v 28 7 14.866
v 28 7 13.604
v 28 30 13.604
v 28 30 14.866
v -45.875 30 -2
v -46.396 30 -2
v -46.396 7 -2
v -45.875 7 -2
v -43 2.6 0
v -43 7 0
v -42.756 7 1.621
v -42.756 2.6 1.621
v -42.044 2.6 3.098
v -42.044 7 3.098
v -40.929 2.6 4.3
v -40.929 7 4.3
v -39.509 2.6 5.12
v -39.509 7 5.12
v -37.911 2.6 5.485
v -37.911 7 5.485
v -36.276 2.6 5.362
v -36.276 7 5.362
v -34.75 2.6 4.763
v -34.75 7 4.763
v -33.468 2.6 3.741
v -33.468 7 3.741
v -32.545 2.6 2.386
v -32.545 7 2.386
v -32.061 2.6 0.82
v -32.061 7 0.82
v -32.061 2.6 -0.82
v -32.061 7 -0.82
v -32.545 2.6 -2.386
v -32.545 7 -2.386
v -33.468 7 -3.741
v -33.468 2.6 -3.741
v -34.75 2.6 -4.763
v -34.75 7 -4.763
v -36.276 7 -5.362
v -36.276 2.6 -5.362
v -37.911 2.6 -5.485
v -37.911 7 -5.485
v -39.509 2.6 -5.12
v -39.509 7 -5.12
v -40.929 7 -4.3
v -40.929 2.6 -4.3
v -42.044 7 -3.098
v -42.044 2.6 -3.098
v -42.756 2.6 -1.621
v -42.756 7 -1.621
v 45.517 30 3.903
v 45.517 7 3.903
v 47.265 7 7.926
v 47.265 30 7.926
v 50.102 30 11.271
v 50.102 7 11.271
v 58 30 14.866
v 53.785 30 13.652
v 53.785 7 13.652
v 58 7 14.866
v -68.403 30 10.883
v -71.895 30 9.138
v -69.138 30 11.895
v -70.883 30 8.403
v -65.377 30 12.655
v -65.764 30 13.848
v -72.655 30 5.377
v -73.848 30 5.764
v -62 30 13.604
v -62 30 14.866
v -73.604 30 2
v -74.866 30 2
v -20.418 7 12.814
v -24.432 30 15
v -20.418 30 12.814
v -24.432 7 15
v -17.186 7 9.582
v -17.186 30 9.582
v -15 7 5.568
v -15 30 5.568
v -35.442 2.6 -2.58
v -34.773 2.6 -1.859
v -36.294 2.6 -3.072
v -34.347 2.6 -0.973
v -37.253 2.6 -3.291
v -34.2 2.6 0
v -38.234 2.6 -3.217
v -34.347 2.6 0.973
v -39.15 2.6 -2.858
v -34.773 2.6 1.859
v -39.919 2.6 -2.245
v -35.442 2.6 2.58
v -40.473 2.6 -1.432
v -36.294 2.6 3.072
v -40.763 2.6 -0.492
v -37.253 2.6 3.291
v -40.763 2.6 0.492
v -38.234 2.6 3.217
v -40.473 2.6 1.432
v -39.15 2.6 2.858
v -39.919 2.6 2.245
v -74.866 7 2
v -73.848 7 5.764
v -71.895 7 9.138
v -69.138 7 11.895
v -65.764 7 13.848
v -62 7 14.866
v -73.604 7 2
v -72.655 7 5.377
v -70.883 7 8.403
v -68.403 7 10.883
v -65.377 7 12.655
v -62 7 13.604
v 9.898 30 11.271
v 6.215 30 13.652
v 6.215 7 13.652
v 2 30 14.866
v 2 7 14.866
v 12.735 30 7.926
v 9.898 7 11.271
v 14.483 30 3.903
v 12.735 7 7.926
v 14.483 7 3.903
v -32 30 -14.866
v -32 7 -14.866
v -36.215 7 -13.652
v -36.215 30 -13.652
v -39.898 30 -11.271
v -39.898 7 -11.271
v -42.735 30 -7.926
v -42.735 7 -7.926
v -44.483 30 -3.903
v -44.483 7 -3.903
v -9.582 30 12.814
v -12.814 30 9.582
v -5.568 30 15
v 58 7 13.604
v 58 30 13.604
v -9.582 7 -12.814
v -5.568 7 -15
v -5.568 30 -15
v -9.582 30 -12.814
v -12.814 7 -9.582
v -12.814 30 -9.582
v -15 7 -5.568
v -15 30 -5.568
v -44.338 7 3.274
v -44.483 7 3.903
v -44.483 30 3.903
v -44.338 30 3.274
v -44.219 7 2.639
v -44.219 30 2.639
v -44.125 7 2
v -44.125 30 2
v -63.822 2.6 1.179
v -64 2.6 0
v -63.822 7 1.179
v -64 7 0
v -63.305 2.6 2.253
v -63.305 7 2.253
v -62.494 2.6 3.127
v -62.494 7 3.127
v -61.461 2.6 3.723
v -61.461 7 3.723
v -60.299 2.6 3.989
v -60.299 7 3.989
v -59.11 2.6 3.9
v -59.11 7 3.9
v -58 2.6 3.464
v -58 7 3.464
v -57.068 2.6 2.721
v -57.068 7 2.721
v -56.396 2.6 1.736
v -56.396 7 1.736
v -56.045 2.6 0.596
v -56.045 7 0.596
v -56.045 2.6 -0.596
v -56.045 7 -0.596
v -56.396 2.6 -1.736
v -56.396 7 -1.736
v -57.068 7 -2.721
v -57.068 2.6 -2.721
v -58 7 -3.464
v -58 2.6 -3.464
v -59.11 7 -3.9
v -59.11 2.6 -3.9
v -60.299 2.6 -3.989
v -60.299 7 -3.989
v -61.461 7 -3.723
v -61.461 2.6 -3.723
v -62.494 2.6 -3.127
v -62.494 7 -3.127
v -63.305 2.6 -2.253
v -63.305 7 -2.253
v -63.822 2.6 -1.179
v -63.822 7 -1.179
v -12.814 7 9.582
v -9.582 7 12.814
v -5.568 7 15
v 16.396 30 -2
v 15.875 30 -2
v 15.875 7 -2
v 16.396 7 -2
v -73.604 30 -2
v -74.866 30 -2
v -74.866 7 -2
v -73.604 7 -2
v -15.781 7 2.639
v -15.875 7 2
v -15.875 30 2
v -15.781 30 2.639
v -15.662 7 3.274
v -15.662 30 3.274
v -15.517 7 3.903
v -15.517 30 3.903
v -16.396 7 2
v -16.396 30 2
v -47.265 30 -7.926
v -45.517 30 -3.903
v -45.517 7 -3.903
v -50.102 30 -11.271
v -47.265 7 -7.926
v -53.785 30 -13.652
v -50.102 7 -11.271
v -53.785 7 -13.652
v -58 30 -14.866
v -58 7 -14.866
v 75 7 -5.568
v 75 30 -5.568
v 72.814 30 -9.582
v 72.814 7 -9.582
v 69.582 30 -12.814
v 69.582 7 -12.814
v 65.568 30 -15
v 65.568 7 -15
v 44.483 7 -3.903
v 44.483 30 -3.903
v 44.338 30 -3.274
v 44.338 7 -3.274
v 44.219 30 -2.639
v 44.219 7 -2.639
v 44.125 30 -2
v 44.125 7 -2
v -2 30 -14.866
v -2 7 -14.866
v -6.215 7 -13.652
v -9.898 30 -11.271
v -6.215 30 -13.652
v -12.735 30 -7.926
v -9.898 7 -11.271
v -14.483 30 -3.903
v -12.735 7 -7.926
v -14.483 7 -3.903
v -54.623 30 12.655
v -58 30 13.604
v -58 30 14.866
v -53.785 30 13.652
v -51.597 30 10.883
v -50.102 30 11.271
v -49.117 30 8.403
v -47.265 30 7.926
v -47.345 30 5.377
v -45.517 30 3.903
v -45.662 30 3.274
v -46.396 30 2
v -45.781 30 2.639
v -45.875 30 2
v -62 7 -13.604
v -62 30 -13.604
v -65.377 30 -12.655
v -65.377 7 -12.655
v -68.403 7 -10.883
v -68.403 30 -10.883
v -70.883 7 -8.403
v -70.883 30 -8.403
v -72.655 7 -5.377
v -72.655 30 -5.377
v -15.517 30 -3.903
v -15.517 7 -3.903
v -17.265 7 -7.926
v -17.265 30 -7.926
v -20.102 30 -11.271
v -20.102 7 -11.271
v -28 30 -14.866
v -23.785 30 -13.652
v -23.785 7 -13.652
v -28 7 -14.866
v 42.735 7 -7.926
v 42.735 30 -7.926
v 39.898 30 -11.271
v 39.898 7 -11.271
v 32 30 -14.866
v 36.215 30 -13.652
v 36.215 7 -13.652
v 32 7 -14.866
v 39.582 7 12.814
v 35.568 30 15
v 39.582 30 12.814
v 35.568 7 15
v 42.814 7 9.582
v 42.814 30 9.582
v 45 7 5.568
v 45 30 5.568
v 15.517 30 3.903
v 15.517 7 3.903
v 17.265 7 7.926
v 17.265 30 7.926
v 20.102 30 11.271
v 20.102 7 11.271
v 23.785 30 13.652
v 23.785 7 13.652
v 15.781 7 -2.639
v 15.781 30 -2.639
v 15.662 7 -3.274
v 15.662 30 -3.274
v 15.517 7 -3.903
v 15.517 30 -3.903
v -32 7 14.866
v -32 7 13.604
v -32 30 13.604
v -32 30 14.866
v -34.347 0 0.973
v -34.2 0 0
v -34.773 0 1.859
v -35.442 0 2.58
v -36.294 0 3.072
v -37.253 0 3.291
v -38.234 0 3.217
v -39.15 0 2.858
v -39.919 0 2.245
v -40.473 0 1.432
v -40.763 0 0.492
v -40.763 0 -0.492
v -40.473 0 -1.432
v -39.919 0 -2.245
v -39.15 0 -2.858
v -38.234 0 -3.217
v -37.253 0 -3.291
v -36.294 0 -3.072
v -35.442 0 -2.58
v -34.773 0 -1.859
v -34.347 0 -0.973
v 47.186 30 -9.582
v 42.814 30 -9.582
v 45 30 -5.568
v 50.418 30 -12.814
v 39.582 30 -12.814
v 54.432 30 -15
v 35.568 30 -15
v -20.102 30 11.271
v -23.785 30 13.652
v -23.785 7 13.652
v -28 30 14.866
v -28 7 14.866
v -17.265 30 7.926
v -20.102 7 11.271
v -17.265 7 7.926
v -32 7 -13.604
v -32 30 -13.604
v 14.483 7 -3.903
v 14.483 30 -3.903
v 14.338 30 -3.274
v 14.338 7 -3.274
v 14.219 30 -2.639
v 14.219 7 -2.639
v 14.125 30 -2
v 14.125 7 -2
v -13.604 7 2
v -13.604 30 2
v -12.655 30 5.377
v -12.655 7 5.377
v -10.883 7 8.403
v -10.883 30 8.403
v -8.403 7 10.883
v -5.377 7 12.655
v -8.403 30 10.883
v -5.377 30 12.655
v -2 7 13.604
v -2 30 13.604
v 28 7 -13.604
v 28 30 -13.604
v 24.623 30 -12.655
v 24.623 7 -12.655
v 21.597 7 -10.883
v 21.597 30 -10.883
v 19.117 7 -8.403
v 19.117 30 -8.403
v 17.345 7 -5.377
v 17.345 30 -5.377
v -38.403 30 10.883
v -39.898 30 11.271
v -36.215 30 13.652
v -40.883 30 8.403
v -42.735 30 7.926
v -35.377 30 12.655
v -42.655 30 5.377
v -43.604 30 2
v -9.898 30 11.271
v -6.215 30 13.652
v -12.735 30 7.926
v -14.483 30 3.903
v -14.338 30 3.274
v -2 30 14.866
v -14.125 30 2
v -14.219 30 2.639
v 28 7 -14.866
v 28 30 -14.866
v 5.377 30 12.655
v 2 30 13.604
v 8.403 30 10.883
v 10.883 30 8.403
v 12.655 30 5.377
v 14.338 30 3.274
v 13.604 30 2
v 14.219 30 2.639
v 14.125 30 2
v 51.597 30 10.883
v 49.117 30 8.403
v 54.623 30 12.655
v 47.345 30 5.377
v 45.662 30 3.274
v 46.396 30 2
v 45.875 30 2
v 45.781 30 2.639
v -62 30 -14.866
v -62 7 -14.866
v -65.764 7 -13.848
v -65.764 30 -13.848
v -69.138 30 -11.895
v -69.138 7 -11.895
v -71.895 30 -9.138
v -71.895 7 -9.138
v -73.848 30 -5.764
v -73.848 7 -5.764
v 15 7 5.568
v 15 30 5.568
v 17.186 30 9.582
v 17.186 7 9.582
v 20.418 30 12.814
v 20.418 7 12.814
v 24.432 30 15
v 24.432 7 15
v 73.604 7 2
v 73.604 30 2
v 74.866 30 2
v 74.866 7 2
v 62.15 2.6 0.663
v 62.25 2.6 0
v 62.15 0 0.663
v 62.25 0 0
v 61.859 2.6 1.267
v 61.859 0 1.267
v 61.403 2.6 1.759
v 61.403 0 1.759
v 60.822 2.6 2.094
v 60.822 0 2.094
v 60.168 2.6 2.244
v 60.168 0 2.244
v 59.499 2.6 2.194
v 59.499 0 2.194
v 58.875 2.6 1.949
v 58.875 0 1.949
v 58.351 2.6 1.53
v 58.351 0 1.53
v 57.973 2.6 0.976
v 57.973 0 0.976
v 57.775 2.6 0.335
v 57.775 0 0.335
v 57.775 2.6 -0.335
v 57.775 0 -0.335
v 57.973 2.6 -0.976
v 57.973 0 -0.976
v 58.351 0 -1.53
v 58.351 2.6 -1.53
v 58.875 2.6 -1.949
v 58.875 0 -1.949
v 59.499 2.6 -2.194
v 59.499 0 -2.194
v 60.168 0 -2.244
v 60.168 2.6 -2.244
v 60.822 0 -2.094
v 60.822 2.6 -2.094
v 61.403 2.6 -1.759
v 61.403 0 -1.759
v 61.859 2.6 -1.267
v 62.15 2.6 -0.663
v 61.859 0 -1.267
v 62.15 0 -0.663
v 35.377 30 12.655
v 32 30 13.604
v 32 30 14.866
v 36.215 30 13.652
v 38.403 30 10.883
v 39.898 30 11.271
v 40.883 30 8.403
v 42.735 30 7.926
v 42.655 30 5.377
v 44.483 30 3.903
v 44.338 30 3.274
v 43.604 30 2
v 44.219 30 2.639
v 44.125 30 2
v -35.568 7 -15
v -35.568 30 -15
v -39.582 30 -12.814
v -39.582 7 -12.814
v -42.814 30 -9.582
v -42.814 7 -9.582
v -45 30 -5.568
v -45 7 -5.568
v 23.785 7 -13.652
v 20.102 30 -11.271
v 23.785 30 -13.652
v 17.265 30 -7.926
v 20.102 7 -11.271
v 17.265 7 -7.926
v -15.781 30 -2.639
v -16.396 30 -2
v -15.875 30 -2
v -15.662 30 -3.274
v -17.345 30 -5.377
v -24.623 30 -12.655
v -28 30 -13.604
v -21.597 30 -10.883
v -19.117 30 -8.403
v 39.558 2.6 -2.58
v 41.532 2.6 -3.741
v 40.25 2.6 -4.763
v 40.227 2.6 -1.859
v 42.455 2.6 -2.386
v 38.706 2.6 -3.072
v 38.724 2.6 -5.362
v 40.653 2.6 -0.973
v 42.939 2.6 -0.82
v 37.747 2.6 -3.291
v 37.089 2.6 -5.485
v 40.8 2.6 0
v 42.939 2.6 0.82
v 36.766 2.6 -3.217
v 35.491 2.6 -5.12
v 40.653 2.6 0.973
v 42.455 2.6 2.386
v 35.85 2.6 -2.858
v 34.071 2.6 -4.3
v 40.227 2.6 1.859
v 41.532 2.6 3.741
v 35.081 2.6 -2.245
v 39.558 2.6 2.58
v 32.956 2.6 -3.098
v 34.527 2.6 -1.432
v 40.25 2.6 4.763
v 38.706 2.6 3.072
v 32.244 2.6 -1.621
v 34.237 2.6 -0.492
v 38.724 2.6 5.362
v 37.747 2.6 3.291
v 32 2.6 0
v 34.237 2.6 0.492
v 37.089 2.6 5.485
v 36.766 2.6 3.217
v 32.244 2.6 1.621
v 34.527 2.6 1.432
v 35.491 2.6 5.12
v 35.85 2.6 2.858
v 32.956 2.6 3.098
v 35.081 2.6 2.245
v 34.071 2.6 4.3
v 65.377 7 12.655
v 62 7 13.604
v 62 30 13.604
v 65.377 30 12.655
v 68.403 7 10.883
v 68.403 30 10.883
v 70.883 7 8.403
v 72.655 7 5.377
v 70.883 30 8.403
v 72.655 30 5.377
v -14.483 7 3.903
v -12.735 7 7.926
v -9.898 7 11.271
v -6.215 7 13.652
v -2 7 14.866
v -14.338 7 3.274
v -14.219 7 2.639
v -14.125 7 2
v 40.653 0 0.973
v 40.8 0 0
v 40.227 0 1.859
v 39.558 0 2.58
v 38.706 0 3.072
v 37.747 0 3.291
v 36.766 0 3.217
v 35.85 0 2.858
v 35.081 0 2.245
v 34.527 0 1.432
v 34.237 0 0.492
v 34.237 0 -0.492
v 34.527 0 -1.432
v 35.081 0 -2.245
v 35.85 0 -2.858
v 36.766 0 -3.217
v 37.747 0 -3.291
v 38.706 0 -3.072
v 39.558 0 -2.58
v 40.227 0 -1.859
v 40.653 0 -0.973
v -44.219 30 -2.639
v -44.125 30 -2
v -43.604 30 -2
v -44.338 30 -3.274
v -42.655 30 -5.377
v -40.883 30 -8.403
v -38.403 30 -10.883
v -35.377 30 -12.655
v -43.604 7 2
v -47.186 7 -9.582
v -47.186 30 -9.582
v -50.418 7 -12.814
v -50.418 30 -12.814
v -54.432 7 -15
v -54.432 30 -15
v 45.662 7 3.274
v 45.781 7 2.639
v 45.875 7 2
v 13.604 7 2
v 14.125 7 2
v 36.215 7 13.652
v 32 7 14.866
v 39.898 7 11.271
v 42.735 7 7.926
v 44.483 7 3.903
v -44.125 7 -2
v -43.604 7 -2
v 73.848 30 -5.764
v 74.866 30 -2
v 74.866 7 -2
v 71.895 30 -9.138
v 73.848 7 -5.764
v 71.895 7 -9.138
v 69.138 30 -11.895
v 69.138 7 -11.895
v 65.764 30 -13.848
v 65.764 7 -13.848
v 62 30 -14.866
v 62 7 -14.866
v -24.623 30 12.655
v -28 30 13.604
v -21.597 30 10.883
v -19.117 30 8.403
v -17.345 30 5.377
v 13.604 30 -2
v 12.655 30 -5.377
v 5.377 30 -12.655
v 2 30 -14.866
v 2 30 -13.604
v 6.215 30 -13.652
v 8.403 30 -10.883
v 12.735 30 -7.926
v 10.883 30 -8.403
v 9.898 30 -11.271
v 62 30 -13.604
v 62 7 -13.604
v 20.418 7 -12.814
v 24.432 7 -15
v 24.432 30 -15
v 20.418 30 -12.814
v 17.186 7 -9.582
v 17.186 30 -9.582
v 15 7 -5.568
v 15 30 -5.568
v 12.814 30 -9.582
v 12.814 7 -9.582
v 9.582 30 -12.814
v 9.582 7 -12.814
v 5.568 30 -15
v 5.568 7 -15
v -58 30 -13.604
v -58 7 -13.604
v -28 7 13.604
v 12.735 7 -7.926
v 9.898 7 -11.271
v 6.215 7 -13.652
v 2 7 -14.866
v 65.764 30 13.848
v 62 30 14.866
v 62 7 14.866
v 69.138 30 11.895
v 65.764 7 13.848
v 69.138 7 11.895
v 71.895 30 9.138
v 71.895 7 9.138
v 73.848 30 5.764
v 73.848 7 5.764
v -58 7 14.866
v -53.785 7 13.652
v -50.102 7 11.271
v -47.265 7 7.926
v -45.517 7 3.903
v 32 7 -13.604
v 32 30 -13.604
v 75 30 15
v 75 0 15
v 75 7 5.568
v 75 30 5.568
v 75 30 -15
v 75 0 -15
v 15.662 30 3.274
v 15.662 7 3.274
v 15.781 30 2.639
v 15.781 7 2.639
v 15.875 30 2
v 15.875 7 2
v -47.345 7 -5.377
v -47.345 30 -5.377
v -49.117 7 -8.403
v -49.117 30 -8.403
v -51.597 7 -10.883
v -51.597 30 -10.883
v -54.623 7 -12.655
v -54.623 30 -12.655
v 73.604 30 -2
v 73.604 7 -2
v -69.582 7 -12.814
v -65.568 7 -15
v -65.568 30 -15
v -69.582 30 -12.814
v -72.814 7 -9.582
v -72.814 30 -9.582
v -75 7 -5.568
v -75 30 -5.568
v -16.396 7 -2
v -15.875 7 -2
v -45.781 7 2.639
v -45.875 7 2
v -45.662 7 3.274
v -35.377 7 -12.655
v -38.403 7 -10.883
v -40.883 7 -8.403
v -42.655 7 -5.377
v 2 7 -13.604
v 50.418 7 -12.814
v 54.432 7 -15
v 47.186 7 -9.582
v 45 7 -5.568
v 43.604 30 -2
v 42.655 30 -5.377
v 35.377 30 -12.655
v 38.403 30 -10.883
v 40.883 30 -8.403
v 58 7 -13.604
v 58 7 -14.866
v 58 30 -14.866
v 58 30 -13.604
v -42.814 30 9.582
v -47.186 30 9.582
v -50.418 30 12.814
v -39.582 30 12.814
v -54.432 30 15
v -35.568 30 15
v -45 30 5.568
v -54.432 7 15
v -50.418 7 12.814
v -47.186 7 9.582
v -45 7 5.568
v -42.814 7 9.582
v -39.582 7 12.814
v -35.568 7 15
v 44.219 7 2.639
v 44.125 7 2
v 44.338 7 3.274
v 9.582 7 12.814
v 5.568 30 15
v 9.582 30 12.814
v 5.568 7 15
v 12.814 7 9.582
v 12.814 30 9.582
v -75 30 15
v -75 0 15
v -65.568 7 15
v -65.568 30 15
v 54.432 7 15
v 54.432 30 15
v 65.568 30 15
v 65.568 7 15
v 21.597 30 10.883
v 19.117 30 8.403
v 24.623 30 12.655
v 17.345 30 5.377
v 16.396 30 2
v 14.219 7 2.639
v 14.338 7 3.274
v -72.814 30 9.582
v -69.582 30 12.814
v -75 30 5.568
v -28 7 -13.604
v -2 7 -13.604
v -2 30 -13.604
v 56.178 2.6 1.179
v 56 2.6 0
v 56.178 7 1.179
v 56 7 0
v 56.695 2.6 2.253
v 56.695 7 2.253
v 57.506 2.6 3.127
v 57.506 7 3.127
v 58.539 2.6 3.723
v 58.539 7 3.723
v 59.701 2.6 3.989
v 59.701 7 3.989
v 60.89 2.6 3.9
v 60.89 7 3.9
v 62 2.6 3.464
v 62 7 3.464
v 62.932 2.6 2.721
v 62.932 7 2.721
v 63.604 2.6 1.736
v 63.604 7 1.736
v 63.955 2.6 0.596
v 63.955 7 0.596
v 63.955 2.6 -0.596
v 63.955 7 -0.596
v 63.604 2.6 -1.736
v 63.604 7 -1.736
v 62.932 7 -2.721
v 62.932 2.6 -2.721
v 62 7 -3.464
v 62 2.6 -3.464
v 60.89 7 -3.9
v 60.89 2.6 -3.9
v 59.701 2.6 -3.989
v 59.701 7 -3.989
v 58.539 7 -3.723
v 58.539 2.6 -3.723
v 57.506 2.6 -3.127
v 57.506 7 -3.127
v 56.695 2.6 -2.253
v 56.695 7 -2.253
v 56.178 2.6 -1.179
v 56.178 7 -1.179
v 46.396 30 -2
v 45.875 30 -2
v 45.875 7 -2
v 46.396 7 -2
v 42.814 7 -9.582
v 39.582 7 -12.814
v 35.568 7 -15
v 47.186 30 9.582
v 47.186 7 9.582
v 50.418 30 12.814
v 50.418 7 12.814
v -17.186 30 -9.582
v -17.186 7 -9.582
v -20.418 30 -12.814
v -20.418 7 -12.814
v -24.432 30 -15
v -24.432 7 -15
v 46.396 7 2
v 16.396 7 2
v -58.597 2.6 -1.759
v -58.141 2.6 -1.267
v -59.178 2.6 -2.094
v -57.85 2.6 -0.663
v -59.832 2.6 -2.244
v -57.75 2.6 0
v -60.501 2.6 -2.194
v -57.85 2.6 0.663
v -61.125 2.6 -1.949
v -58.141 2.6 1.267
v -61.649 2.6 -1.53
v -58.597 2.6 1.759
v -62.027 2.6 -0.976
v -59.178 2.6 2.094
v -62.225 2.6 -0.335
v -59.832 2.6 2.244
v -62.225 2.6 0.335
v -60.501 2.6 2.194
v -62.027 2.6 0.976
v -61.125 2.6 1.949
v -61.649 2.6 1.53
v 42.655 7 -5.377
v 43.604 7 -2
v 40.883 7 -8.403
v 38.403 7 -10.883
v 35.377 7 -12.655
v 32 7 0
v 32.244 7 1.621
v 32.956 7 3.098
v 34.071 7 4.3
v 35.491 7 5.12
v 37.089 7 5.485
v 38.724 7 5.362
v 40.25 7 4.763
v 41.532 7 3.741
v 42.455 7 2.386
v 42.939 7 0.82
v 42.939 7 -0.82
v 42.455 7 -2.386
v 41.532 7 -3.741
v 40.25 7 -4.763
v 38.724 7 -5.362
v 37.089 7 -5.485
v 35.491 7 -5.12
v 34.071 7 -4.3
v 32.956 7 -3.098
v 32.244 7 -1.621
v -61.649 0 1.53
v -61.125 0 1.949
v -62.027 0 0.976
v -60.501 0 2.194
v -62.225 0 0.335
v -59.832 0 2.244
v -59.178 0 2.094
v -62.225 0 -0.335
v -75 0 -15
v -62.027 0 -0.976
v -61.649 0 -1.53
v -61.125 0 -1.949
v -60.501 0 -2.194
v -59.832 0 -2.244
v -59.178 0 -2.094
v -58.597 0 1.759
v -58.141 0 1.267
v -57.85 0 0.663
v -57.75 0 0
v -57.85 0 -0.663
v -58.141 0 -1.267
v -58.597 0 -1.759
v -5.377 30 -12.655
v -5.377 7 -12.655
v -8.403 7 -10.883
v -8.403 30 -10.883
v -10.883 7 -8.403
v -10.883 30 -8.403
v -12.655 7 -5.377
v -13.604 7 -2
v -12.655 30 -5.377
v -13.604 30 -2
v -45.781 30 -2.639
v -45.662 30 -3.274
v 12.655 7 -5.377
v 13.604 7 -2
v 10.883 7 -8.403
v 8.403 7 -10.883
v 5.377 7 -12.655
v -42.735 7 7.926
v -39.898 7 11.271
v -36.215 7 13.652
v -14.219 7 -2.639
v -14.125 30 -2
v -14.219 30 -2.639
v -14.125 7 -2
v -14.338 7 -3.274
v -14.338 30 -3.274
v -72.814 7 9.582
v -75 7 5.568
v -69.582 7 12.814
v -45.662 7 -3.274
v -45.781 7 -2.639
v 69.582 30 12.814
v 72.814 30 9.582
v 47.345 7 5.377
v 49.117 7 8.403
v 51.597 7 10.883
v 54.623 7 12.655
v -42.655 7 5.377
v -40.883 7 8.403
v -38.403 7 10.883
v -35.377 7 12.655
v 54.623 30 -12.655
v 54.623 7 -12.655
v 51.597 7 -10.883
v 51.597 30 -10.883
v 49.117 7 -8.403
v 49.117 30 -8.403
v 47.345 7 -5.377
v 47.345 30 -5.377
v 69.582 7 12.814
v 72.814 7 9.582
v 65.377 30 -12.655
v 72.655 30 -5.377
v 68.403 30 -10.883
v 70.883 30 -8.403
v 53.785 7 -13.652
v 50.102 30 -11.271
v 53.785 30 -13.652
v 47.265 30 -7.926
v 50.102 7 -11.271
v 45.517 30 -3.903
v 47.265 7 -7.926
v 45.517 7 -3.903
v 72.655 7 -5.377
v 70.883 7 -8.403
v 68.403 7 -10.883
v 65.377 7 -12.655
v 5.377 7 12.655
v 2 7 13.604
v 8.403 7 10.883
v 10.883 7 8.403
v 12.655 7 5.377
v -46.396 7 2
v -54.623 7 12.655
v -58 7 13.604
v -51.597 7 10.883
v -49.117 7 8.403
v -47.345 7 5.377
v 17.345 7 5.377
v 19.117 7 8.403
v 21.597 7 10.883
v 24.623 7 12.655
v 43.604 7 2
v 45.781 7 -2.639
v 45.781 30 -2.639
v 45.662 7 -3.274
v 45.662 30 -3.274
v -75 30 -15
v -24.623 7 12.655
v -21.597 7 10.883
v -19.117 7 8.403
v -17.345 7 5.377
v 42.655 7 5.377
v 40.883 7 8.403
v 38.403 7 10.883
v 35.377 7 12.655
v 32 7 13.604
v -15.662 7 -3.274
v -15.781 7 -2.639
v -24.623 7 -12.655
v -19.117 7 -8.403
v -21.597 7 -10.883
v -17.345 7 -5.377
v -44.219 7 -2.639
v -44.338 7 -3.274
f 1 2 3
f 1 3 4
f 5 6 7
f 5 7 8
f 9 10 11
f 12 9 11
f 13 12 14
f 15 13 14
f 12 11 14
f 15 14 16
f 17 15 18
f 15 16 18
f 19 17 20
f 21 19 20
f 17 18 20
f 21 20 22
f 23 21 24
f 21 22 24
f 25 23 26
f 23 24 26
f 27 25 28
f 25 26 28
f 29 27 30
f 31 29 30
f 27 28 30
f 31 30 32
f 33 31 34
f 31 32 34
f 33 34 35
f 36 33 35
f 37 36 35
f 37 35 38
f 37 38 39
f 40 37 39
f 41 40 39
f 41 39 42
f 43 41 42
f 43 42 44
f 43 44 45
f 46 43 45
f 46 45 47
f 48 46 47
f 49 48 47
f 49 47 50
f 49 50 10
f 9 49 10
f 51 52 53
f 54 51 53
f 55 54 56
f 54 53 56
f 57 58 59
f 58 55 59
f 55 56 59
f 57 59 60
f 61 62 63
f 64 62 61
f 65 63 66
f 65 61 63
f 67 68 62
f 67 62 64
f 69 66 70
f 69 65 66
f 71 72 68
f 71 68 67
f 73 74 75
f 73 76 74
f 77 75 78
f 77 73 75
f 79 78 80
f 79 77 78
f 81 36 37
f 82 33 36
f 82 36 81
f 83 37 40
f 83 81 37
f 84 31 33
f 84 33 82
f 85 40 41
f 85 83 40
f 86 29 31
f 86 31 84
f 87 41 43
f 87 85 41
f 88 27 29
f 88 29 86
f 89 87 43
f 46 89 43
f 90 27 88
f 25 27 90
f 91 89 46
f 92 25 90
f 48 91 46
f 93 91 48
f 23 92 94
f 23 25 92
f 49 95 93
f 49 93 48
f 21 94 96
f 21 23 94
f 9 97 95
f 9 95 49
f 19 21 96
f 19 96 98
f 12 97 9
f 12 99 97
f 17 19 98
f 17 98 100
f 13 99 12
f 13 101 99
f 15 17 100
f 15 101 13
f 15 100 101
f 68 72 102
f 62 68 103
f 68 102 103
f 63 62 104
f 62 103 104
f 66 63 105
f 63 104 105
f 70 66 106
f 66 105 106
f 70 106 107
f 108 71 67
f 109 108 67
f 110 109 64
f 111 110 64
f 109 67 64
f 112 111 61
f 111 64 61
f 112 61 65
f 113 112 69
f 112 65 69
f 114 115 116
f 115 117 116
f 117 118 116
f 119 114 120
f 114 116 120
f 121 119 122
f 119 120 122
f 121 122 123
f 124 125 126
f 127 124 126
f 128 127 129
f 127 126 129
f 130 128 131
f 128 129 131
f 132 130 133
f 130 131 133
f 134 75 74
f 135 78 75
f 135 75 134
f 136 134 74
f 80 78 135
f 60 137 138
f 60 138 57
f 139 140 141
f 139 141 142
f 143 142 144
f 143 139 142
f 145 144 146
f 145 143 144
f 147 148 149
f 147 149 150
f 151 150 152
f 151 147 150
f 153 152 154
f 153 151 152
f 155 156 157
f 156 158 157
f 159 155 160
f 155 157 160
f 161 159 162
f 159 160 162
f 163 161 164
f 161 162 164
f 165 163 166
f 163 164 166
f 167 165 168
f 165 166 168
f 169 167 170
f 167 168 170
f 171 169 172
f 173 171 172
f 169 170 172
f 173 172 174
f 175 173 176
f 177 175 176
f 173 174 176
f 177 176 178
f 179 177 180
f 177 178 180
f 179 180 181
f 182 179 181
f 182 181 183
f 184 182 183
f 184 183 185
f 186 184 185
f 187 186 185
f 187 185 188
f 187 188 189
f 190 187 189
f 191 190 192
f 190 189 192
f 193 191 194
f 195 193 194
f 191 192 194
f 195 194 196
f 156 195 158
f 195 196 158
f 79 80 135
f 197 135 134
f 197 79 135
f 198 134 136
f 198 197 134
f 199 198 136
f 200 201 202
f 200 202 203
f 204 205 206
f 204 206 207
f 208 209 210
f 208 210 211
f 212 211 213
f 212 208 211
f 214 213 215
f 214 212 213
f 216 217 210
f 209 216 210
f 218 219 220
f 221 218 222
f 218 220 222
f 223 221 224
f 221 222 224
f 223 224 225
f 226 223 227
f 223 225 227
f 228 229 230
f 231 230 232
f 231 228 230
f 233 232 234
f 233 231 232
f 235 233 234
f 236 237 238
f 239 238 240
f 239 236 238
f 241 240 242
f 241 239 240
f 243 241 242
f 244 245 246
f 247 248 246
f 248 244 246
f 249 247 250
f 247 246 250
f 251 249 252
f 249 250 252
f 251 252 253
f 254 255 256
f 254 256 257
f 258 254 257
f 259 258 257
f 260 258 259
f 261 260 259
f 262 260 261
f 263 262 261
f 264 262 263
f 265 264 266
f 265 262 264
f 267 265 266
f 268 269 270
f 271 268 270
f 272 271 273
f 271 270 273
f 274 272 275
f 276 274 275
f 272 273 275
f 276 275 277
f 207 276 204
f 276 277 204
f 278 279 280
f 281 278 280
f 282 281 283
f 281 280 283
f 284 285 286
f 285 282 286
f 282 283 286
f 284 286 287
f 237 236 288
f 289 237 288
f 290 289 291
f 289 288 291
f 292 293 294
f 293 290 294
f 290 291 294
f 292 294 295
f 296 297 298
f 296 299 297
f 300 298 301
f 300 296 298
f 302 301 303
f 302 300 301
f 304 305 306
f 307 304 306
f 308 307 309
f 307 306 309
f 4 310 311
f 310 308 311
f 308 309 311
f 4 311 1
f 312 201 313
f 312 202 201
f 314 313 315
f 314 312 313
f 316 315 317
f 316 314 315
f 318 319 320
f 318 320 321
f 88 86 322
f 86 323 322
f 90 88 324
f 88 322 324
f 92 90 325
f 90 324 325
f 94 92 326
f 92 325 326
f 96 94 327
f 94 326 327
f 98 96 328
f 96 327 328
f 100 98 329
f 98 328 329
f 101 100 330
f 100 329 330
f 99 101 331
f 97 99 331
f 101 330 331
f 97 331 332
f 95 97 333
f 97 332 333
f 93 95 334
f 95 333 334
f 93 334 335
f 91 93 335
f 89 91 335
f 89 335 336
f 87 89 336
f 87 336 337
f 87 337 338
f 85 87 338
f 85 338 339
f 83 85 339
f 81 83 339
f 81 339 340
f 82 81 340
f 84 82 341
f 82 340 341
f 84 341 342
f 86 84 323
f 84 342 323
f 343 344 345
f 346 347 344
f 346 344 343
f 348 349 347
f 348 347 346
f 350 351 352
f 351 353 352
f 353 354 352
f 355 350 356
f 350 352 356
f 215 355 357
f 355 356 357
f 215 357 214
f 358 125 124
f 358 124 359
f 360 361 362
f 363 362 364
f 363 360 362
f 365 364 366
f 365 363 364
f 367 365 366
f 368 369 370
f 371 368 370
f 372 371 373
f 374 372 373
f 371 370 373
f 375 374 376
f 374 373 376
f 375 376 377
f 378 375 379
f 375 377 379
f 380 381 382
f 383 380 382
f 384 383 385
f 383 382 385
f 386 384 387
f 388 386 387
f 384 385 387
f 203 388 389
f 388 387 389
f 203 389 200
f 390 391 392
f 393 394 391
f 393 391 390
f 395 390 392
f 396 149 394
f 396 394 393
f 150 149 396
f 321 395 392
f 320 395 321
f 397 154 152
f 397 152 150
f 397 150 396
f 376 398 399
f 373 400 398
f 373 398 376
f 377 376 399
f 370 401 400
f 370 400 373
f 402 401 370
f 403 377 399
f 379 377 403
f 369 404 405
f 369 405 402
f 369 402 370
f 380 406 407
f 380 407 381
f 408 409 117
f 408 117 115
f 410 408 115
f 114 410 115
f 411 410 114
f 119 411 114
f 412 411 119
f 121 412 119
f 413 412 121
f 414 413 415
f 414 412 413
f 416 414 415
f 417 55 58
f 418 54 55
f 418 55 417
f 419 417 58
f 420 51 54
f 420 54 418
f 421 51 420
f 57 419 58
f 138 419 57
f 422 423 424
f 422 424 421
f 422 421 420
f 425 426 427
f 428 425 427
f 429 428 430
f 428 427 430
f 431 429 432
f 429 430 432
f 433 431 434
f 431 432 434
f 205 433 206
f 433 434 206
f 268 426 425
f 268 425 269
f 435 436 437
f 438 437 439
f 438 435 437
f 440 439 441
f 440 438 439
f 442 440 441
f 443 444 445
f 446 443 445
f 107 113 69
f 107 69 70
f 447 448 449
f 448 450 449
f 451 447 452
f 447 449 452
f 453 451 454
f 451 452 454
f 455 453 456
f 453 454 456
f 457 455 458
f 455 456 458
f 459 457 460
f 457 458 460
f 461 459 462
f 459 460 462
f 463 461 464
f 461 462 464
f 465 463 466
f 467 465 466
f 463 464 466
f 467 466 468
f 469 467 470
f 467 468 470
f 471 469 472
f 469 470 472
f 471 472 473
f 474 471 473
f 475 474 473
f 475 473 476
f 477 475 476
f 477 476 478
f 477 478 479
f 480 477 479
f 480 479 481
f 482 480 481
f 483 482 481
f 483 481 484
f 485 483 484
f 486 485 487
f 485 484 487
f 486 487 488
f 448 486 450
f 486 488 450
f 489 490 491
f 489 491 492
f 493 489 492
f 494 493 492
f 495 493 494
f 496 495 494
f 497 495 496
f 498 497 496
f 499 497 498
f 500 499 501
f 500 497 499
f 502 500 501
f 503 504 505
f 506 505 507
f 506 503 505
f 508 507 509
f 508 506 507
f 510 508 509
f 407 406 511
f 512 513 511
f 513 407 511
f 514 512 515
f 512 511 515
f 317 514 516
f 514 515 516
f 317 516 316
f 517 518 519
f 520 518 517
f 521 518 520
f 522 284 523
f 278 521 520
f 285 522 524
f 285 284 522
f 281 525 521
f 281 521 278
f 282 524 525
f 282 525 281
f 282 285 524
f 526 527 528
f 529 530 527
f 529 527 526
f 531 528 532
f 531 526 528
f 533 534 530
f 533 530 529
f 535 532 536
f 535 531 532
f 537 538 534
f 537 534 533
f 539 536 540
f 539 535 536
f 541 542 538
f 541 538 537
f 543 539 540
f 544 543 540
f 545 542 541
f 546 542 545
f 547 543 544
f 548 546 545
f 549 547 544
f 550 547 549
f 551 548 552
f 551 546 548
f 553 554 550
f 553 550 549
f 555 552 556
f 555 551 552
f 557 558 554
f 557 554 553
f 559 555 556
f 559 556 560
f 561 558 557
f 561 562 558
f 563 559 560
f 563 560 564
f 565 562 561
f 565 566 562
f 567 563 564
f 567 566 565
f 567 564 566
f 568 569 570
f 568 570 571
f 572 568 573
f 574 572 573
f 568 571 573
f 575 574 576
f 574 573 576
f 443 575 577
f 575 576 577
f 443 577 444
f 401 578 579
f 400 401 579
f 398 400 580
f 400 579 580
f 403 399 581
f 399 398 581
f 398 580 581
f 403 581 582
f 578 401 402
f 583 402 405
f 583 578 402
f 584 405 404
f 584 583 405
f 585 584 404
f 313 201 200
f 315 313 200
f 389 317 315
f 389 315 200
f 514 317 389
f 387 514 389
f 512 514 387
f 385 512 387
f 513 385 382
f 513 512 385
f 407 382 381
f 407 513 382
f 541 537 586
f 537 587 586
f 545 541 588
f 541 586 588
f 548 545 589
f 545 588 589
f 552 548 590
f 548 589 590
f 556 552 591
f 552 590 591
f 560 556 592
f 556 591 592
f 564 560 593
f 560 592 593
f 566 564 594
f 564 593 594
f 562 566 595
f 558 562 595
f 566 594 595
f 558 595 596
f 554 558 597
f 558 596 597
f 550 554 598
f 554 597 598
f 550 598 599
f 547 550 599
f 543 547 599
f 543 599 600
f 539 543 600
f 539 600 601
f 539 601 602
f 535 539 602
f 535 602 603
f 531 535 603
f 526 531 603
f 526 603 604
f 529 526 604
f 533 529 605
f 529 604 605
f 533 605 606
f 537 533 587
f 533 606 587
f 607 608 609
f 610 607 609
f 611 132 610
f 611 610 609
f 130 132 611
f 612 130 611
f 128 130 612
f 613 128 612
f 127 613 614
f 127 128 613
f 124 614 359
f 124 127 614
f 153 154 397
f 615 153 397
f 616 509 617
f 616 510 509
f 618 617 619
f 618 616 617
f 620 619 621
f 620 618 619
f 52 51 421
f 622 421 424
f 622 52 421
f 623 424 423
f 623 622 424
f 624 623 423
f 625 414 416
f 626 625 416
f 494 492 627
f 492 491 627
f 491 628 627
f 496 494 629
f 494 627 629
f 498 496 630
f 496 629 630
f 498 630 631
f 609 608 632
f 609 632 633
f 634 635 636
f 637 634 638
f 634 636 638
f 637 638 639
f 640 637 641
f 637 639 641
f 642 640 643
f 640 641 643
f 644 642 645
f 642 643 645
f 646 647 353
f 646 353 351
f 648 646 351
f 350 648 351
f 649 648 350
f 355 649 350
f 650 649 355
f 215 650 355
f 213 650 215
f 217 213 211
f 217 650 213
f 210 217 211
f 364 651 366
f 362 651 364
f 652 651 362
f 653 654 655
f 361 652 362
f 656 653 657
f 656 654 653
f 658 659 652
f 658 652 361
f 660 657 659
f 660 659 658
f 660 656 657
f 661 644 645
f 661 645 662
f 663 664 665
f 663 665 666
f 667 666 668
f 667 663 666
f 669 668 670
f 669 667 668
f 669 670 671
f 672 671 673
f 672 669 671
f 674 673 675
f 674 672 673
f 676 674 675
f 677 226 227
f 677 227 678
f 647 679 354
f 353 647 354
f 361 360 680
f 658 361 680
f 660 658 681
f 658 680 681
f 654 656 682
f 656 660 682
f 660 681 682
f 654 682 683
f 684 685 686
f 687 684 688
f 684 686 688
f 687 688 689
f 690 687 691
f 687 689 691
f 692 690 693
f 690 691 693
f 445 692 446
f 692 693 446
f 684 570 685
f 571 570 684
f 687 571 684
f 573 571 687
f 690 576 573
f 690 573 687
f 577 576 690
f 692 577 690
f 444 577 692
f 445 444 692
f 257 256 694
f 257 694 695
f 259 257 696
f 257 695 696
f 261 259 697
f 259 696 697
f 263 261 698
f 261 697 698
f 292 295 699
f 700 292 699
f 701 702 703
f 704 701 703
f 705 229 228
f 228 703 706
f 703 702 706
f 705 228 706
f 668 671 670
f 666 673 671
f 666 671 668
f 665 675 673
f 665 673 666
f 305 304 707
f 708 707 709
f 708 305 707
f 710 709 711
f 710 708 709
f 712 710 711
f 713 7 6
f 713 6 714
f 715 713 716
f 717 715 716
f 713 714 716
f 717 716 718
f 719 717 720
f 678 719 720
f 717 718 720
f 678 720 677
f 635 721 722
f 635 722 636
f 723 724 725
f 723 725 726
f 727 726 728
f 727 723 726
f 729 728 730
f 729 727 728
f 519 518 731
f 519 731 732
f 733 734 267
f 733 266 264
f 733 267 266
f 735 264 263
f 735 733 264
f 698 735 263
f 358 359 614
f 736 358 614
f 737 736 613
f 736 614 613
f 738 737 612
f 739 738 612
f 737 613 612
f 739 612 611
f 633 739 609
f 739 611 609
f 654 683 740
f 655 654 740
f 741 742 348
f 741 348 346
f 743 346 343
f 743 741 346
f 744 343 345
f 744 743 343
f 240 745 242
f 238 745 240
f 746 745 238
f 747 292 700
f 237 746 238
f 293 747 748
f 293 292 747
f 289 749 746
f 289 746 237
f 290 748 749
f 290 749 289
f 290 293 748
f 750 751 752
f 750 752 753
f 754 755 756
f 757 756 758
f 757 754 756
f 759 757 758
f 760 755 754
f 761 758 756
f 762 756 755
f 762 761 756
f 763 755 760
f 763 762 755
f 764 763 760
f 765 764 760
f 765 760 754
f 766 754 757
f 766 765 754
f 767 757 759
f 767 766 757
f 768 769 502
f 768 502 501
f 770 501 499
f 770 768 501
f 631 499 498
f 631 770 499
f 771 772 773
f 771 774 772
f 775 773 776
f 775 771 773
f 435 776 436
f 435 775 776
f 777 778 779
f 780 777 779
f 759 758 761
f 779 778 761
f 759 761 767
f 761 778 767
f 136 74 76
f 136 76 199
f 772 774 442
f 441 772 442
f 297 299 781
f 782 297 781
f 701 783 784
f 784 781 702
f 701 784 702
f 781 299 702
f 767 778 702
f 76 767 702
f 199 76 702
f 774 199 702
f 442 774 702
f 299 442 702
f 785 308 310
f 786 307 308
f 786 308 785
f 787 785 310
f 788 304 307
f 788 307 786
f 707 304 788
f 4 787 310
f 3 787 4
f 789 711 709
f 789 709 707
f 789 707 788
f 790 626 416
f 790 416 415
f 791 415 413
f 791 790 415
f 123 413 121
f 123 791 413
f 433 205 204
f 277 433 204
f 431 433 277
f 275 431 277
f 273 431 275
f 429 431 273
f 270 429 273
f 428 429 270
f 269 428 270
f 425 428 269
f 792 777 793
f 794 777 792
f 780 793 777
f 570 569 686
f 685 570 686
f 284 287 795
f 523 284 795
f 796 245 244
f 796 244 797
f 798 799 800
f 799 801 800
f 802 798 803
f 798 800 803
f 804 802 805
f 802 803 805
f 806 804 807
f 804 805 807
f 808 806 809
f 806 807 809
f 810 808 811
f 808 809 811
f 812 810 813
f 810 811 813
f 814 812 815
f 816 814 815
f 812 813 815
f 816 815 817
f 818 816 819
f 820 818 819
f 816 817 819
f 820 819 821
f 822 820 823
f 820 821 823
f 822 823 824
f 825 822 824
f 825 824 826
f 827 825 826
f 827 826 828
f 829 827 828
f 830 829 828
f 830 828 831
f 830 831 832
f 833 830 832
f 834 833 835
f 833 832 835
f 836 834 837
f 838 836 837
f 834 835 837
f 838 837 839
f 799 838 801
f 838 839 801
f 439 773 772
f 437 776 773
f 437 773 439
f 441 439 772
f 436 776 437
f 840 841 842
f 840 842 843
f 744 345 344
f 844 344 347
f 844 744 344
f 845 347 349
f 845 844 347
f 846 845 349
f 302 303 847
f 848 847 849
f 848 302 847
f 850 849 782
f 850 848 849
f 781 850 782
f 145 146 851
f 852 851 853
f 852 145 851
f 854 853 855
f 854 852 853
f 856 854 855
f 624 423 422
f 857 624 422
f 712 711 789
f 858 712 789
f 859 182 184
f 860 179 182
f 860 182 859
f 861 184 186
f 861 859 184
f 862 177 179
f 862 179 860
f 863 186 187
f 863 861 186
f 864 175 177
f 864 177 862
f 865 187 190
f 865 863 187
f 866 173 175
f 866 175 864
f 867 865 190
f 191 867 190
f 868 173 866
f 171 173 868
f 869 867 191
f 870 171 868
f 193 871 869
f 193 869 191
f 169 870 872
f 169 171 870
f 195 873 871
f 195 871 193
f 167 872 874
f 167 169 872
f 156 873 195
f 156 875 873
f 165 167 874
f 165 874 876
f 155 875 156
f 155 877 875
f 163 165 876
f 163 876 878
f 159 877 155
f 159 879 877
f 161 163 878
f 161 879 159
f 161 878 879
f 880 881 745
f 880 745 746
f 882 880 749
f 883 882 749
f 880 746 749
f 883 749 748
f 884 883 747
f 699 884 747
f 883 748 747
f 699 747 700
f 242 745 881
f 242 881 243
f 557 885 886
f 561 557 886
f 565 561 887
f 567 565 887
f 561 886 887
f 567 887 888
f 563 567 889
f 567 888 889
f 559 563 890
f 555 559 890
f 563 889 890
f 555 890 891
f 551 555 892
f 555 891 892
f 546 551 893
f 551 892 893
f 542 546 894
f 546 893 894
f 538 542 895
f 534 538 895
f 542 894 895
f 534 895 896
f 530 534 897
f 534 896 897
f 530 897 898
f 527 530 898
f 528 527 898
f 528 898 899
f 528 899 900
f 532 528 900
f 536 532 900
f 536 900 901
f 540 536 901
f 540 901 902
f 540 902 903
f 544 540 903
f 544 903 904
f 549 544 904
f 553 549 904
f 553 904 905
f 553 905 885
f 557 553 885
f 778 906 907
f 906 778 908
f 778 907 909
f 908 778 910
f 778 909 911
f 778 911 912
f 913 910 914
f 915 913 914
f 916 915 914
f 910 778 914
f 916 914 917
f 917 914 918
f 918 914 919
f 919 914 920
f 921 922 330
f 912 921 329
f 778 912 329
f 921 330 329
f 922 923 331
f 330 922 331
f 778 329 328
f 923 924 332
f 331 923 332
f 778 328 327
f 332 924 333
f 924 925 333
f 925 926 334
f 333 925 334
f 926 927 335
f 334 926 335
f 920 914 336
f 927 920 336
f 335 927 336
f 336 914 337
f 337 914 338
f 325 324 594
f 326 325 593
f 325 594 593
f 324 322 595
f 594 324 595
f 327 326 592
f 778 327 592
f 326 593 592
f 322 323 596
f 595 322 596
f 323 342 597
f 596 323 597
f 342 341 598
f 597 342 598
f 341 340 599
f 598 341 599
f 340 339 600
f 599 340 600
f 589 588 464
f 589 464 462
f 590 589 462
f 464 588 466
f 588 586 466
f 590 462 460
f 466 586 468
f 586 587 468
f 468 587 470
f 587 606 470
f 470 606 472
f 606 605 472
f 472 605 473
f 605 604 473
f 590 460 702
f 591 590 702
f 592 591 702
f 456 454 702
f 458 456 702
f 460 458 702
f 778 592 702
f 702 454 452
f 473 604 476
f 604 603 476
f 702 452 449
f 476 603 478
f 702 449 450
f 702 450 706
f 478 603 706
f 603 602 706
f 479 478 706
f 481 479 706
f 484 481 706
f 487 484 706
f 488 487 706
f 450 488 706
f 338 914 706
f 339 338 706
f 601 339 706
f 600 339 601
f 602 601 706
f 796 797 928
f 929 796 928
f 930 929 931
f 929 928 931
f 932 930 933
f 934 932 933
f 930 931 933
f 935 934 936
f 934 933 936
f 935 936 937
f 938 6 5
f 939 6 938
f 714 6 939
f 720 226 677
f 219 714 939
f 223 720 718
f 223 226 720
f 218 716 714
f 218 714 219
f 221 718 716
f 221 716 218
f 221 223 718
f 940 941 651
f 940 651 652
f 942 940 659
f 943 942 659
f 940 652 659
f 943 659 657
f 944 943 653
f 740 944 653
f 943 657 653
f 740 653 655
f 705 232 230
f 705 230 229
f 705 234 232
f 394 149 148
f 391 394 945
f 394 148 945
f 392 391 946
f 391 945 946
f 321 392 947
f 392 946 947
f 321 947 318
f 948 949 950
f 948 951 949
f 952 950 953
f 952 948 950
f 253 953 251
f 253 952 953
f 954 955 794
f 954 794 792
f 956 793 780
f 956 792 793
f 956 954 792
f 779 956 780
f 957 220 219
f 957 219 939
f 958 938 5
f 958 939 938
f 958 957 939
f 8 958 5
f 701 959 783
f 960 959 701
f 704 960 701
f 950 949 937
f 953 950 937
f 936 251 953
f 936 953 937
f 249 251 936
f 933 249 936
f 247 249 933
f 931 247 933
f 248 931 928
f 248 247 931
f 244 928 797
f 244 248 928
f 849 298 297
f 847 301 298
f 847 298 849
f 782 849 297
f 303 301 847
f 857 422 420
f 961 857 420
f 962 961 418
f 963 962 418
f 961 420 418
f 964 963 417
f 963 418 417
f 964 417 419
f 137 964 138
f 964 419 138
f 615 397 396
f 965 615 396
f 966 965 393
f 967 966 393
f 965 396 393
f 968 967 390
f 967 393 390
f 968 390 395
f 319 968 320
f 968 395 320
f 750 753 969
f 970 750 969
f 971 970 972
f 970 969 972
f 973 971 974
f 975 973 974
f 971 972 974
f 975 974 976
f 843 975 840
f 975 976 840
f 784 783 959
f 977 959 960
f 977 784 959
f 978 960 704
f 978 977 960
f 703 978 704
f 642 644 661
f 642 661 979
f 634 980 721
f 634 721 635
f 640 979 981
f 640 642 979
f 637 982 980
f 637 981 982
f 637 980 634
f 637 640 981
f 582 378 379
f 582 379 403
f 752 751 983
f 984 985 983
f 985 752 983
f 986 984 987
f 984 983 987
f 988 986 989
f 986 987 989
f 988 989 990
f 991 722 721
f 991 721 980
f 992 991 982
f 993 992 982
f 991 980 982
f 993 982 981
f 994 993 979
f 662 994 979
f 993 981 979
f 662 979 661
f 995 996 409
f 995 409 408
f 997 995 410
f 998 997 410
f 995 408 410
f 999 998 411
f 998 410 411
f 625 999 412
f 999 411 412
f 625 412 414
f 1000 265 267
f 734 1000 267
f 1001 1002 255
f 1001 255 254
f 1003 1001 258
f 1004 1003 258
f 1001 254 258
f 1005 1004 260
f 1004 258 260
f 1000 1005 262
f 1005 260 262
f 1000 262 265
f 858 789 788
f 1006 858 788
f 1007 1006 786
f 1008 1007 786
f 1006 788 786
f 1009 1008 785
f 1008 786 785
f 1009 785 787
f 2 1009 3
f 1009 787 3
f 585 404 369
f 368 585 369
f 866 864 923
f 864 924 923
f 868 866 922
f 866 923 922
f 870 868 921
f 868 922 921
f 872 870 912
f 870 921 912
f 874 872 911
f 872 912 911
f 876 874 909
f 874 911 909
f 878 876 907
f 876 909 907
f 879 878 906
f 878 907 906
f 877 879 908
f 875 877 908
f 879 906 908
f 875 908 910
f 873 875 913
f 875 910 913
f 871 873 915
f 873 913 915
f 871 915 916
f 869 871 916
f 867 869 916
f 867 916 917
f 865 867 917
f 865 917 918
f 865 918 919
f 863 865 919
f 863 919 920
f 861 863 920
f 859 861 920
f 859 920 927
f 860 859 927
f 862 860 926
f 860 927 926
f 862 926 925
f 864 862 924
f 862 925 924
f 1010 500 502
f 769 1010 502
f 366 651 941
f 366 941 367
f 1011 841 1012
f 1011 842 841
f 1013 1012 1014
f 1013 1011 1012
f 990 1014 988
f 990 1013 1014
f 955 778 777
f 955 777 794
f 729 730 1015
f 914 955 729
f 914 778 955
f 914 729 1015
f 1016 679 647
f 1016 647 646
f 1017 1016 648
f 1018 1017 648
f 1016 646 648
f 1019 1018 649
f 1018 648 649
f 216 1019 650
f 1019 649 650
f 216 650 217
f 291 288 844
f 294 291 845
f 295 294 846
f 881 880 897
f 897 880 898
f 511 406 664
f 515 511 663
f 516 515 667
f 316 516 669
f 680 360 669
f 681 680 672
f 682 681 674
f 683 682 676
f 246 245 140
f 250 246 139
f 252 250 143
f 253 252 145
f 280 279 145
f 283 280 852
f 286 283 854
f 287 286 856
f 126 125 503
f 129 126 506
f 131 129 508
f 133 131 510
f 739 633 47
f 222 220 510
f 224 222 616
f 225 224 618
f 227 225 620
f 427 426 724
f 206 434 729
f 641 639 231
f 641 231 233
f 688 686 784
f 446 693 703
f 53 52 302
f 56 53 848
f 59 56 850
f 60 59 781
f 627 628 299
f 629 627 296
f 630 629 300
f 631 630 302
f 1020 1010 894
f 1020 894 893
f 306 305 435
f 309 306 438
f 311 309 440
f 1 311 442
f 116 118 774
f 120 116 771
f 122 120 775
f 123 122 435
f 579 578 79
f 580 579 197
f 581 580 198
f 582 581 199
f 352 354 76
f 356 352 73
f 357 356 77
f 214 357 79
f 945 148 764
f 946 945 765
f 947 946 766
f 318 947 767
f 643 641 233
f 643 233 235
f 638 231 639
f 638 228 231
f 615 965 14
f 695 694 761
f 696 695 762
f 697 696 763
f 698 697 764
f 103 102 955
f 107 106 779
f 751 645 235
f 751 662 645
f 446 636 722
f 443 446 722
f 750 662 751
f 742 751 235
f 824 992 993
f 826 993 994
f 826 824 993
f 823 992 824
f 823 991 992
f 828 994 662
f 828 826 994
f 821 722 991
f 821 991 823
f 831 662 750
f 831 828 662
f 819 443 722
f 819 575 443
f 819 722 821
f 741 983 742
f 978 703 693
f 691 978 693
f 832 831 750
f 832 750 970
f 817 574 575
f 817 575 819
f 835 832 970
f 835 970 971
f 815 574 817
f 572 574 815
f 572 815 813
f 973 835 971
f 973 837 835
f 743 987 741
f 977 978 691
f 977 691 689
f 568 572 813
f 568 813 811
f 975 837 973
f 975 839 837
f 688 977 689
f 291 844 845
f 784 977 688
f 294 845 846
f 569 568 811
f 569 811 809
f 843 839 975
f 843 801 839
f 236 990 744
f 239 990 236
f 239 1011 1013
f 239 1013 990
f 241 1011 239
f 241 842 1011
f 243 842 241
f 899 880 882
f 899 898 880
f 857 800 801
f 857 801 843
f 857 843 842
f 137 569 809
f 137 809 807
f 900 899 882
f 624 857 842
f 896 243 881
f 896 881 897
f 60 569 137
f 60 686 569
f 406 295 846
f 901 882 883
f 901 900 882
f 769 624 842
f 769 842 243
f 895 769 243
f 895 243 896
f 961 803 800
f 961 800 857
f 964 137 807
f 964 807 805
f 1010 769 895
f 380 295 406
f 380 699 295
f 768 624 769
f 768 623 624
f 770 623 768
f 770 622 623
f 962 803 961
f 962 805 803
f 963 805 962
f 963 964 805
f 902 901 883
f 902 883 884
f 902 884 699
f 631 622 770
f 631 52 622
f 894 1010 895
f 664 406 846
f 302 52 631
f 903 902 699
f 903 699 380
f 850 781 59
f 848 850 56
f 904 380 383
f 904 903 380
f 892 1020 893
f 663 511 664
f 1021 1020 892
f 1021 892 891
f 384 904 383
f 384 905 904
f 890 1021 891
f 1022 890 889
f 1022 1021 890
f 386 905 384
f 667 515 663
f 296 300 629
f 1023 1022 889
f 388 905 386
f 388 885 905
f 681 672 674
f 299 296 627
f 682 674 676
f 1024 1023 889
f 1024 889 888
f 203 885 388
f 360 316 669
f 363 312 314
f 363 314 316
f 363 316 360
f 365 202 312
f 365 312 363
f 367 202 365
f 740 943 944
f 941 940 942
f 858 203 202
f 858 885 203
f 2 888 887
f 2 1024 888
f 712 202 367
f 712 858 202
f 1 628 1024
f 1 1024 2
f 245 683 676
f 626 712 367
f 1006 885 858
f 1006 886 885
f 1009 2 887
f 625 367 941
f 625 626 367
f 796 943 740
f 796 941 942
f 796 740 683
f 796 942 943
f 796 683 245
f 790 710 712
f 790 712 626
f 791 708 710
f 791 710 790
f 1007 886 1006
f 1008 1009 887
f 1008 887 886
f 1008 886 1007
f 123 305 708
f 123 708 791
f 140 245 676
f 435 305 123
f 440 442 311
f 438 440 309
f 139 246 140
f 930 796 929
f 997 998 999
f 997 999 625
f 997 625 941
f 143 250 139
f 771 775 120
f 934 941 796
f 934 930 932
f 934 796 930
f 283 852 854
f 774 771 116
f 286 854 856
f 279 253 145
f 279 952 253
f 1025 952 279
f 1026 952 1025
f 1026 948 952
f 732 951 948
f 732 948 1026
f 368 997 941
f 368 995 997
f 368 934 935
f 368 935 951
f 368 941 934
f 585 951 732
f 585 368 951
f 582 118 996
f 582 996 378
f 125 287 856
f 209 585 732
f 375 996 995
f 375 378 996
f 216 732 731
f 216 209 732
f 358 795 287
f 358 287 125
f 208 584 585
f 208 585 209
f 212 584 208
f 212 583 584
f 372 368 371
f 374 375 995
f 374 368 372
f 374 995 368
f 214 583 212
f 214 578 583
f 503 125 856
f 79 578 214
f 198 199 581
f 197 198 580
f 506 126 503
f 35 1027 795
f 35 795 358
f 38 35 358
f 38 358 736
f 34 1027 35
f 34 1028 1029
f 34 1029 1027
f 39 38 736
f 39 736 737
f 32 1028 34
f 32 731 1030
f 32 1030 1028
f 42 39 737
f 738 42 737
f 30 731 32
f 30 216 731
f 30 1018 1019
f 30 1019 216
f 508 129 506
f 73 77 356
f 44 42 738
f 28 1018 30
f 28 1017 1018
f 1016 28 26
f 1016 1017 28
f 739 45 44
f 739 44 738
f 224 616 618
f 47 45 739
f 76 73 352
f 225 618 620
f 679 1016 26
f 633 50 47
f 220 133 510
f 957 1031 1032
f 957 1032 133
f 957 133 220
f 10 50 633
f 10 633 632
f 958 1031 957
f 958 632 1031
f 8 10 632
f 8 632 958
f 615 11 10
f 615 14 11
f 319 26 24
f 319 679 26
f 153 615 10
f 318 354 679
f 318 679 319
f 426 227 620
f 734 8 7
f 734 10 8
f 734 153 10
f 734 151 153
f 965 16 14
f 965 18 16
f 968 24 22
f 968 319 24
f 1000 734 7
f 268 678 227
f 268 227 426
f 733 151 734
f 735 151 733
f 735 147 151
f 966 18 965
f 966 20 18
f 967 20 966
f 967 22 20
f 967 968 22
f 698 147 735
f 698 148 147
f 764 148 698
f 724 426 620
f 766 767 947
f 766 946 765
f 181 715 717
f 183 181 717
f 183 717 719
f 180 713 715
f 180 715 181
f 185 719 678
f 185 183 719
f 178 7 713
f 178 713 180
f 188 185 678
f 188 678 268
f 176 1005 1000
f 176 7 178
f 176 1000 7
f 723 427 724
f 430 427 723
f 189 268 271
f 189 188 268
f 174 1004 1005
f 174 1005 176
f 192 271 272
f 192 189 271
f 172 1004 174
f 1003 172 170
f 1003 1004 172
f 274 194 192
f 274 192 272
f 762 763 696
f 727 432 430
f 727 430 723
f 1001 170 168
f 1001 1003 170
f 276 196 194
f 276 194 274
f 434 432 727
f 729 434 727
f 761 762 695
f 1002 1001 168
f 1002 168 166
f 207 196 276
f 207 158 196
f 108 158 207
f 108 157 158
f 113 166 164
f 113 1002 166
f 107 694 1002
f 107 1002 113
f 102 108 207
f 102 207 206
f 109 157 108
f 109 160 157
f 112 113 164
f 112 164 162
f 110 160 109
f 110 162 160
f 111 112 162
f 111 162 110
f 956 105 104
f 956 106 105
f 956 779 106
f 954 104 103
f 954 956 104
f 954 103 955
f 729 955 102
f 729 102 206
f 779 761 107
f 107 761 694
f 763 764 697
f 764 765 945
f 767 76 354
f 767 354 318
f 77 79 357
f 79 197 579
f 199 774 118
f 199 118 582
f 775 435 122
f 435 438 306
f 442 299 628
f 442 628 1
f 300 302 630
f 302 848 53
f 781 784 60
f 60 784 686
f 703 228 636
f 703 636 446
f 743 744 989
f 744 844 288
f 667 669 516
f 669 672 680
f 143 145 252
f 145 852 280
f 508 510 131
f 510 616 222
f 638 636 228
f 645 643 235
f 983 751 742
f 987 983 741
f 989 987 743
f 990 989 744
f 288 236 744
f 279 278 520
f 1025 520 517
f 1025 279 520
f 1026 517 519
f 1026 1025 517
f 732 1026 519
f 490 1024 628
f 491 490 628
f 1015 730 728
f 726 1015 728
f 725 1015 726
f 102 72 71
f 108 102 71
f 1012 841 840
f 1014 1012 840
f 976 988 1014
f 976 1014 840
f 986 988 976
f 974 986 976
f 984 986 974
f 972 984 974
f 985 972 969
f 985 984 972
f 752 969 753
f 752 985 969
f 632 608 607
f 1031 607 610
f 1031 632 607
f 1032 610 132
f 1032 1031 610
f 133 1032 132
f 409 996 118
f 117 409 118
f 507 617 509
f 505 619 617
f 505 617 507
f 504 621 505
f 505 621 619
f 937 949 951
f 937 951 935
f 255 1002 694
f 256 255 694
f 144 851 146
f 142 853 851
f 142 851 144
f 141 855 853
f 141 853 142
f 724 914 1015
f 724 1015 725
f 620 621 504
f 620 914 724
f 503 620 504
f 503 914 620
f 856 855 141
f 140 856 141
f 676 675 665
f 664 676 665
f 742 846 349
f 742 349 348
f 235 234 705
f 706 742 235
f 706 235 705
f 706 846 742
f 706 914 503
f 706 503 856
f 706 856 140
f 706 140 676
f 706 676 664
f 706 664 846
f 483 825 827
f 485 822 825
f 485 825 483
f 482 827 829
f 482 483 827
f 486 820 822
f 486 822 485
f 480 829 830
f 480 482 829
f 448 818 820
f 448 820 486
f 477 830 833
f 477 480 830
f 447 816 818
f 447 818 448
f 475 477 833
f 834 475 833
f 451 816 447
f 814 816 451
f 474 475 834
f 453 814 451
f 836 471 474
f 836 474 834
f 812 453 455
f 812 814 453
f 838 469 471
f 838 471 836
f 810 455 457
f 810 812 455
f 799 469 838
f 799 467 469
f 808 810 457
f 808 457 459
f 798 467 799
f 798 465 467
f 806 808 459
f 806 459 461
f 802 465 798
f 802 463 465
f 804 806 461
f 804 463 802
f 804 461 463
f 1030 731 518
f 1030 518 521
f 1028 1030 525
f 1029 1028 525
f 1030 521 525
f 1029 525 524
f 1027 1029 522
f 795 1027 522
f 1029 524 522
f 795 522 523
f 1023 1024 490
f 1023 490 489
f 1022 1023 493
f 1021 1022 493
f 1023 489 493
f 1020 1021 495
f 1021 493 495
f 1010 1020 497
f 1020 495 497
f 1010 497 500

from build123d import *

# Parameters (mm, degrees)
SKETCH2_W                                           = 150
SKETCH2_H                                           = 30
BOSS_EXTRUDE1_DEPTH                                 = 30
SKETCH3_R                                           = 13.75
CUT_EXTRUDE1_DEPTH                                  = 23
LPATTERN1_COUNT                                     = 5
LPATTERN1_PITCH                                     = 30
CBORE_FOR_M4_HEX_SOCKET_HEAD_CAP_SCREW1_D           = 4.5
CBORE_FOR_M4_HEX_SOCKET_HEAD_CAP_SCREW1_CBORE_D     = 8
CBORE_FOR_M4_HEX_SOCKET_HEAD_CAP_SCREW1_CBORE_DEPTH = 4.4
LPATTERN2_COUNT                                     = 2
LPATTERN2_PITCH                                     = 120
SKETCH7_W                                           = 181.12901383
SKETCH7_H                                           = 4
CUT_EXTRUDE3_DEPTH                                  = 23
SKETCH8_W                                           = 4
SKETCH8_H                                           = 50
CUT_EXTRUDE4_DEPTH                                  = 23
SKIZZE1_R                                           = 16
SKIZZE1_R_2                                         = 15
SCHNITT_LINEAR_AUSTRAGEN1_DEPTH                     = 80.868642157
LPATTERN3_COUNT                                     = 5
LPATTERN3_PITCH                                     = 30
CBORE_FOR_M6_HEX_SOCKET_HEAD_CAP_SCREW1_D           = 6.6
CBORE_FOR_M6_HEX_SOCKET_HEAD_CAP_SCREW1_CBORE_D     = 11
CBORE_FOR_M6_HEX_SOCKET_HEAD_CAP_SCREW1_CBORE_DEPTH = 4.4
LPATTERN4_COUNT                                     = 2
LPATTERN4_PITCH                                     = 75


with BuildPart() as part:
    # Sketch2 → Boss-Extrude1 (new body)
    with BuildSketch(Plane(origin=(0, 0, 0), x_dir=(1, 0, 0), z_dir=(0, 1, 0))):
        Rectangle(SKETCH2_W, SKETCH2_H)
    extrude(amount=BOSS_EXTRUDE1_DEPTH)

    # Sketch3 → Cut-Extrude1 (cut)
    with BuildSketch(Plane(origin=(0, 30, 0), x_dir=(1, 0, 0), z_dir=(0, 1, 0))):
        with Locations(Location((-60, 0, 0), (0, 0, 270))):
            Circle(SKETCH3_R)
    cut_extrude1 = extrude(amount=-CUT_EXTRUDE1_DEPTH, mode=Mode.SUBTRACT)

    # LPattern1: Cut-Extrude1 ×5
    with Locations(*[(i * LPATTERN1_PITCH, 0, 0) for i in range(1, LPATTERN1_COUNT)]):
        add(cut_extrude1, mode=Mode.SUBTRACT)

    # CBORE for M4 Hex Socket Head Cap Screw1 (through all)
    with Locations(Plane(origin=(0, 7, 0), x_dir=(-1, 0, 0), z_dir=(0, 1, 0))):
        with Locations((60, 0)):
            cbore_for_m4_hex_socket_head_cap_screw1 = CounterBoreHole(CBORE_FOR_M4_HEX_SOCKET_HEAD_CAP_SCREW1_D / 2, CBORE_FOR_M4_HEX_SOCKET_HEAD_CAP_SCREW1_CBORE_D / 2, CBORE_FOR_M4_HEX_SOCKET_HEAD_CAP_SCREW1_CBORE_DEPTH)

    # LPattern2: CBORE for M4 Hex Socket Head Cap Screw1 ×2
    with Locations(*[(i * LPATTERN2_PITCH, 0, 0) for i in range(1, LPATTERN2_COUNT)]):
        add(cbore_for_m4_hex_socket_head_cap_screw1, mode=Mode.SUBTRACT)

    # Sketch7 → Cut-Extrude3 (cut)
    with BuildSketch(Plane(origin=(0, 30, 0), x_dir=(1, 0, 0), z_dir=(0, 1, 0))):
        Rectangle(SKETCH7_W, SKETCH7_H)
    extrude(amount=-CUT_EXTRUDE3_DEPTH, mode=Mode.SUBTRACT)

    # Sketch8 → Cut-Extrude4 (cut)
    with BuildSketch(Plane(origin=(0, 30, 0), x_dir=(-1, 0, 0), z_dir=(0, 1, 0))):
        with Locations((60, -1.298701607)):
            Rectangle(SKETCH8_W, SKETCH8_H)
    cut_extrude4 = extrude(amount=-CUT_EXTRUDE4_DEPTH, mode=Mode.SUBTRACT)

    # Skizze1 → Schnitt-Linear austragen1 (cut, through all)
    with BuildSketch(Plane(origin=(0, 7, 0), x_dir=(-1, 0, 0), z_dir=(0, 1, 0))):
        with Locations((60, 0)):
            Circle(SKIZZE1_R)
        with Locations((60, 0)):
            Circle(SKIZZE1_R_2, mode=Mode.SUBTRACT)
    schnitt_linear_austragen1 = extrude(amount=SCHNITT_LINEAR_AUSTRAGEN1_DEPTH, mode=Mode.SUBTRACT)

    # LPattern3: Cut-Extrude4, Schnitt-Linear austragen1 ×5
    with Locations(*[(i * LPATTERN3_PITCH, 0, 0) for i in range(1, LPATTERN3_COUNT)]):
        add(cut_extrude4, mode=Mode.SUBTRACT)
        add(schnitt_linear_austragen1, mode=Mode.SUBTRACT)

    # CBORE for M6 Hex Socket Head Cap Screw1 (through all)
    with Locations(Plane(origin=(0, 7, 0), x_dir=(-1, 0, 0), z_dir=(0, 1, 0))):
        with Locations((37.5, 0)):
            cbore_for_m6_hex_socket_head_cap_screw1 = CounterBoreHole(CBORE_FOR_M6_HEX_SOCKET_HEAD_CAP_SCREW1_D / 2, CBORE_FOR_M6_HEX_SOCKET_HEAD_CAP_SCREW1_CBORE_D / 2, CBORE_FOR_M6_HEX_SOCKET_HEAD_CAP_SCREW1_CBORE_DEPTH)

    # LPattern4: CBORE for M6 Hex Socket Head Cap Screw1 ×2
    with Locations(*[(i * LPATTERN4_PITCH, 0, 0) for i in range(1, LPATTERN4_COUNT)]):
        add(cbore_for_m6_hex_socket_head_cap_screw1, mode=Mode.SUBTRACT)


solid = part.part
